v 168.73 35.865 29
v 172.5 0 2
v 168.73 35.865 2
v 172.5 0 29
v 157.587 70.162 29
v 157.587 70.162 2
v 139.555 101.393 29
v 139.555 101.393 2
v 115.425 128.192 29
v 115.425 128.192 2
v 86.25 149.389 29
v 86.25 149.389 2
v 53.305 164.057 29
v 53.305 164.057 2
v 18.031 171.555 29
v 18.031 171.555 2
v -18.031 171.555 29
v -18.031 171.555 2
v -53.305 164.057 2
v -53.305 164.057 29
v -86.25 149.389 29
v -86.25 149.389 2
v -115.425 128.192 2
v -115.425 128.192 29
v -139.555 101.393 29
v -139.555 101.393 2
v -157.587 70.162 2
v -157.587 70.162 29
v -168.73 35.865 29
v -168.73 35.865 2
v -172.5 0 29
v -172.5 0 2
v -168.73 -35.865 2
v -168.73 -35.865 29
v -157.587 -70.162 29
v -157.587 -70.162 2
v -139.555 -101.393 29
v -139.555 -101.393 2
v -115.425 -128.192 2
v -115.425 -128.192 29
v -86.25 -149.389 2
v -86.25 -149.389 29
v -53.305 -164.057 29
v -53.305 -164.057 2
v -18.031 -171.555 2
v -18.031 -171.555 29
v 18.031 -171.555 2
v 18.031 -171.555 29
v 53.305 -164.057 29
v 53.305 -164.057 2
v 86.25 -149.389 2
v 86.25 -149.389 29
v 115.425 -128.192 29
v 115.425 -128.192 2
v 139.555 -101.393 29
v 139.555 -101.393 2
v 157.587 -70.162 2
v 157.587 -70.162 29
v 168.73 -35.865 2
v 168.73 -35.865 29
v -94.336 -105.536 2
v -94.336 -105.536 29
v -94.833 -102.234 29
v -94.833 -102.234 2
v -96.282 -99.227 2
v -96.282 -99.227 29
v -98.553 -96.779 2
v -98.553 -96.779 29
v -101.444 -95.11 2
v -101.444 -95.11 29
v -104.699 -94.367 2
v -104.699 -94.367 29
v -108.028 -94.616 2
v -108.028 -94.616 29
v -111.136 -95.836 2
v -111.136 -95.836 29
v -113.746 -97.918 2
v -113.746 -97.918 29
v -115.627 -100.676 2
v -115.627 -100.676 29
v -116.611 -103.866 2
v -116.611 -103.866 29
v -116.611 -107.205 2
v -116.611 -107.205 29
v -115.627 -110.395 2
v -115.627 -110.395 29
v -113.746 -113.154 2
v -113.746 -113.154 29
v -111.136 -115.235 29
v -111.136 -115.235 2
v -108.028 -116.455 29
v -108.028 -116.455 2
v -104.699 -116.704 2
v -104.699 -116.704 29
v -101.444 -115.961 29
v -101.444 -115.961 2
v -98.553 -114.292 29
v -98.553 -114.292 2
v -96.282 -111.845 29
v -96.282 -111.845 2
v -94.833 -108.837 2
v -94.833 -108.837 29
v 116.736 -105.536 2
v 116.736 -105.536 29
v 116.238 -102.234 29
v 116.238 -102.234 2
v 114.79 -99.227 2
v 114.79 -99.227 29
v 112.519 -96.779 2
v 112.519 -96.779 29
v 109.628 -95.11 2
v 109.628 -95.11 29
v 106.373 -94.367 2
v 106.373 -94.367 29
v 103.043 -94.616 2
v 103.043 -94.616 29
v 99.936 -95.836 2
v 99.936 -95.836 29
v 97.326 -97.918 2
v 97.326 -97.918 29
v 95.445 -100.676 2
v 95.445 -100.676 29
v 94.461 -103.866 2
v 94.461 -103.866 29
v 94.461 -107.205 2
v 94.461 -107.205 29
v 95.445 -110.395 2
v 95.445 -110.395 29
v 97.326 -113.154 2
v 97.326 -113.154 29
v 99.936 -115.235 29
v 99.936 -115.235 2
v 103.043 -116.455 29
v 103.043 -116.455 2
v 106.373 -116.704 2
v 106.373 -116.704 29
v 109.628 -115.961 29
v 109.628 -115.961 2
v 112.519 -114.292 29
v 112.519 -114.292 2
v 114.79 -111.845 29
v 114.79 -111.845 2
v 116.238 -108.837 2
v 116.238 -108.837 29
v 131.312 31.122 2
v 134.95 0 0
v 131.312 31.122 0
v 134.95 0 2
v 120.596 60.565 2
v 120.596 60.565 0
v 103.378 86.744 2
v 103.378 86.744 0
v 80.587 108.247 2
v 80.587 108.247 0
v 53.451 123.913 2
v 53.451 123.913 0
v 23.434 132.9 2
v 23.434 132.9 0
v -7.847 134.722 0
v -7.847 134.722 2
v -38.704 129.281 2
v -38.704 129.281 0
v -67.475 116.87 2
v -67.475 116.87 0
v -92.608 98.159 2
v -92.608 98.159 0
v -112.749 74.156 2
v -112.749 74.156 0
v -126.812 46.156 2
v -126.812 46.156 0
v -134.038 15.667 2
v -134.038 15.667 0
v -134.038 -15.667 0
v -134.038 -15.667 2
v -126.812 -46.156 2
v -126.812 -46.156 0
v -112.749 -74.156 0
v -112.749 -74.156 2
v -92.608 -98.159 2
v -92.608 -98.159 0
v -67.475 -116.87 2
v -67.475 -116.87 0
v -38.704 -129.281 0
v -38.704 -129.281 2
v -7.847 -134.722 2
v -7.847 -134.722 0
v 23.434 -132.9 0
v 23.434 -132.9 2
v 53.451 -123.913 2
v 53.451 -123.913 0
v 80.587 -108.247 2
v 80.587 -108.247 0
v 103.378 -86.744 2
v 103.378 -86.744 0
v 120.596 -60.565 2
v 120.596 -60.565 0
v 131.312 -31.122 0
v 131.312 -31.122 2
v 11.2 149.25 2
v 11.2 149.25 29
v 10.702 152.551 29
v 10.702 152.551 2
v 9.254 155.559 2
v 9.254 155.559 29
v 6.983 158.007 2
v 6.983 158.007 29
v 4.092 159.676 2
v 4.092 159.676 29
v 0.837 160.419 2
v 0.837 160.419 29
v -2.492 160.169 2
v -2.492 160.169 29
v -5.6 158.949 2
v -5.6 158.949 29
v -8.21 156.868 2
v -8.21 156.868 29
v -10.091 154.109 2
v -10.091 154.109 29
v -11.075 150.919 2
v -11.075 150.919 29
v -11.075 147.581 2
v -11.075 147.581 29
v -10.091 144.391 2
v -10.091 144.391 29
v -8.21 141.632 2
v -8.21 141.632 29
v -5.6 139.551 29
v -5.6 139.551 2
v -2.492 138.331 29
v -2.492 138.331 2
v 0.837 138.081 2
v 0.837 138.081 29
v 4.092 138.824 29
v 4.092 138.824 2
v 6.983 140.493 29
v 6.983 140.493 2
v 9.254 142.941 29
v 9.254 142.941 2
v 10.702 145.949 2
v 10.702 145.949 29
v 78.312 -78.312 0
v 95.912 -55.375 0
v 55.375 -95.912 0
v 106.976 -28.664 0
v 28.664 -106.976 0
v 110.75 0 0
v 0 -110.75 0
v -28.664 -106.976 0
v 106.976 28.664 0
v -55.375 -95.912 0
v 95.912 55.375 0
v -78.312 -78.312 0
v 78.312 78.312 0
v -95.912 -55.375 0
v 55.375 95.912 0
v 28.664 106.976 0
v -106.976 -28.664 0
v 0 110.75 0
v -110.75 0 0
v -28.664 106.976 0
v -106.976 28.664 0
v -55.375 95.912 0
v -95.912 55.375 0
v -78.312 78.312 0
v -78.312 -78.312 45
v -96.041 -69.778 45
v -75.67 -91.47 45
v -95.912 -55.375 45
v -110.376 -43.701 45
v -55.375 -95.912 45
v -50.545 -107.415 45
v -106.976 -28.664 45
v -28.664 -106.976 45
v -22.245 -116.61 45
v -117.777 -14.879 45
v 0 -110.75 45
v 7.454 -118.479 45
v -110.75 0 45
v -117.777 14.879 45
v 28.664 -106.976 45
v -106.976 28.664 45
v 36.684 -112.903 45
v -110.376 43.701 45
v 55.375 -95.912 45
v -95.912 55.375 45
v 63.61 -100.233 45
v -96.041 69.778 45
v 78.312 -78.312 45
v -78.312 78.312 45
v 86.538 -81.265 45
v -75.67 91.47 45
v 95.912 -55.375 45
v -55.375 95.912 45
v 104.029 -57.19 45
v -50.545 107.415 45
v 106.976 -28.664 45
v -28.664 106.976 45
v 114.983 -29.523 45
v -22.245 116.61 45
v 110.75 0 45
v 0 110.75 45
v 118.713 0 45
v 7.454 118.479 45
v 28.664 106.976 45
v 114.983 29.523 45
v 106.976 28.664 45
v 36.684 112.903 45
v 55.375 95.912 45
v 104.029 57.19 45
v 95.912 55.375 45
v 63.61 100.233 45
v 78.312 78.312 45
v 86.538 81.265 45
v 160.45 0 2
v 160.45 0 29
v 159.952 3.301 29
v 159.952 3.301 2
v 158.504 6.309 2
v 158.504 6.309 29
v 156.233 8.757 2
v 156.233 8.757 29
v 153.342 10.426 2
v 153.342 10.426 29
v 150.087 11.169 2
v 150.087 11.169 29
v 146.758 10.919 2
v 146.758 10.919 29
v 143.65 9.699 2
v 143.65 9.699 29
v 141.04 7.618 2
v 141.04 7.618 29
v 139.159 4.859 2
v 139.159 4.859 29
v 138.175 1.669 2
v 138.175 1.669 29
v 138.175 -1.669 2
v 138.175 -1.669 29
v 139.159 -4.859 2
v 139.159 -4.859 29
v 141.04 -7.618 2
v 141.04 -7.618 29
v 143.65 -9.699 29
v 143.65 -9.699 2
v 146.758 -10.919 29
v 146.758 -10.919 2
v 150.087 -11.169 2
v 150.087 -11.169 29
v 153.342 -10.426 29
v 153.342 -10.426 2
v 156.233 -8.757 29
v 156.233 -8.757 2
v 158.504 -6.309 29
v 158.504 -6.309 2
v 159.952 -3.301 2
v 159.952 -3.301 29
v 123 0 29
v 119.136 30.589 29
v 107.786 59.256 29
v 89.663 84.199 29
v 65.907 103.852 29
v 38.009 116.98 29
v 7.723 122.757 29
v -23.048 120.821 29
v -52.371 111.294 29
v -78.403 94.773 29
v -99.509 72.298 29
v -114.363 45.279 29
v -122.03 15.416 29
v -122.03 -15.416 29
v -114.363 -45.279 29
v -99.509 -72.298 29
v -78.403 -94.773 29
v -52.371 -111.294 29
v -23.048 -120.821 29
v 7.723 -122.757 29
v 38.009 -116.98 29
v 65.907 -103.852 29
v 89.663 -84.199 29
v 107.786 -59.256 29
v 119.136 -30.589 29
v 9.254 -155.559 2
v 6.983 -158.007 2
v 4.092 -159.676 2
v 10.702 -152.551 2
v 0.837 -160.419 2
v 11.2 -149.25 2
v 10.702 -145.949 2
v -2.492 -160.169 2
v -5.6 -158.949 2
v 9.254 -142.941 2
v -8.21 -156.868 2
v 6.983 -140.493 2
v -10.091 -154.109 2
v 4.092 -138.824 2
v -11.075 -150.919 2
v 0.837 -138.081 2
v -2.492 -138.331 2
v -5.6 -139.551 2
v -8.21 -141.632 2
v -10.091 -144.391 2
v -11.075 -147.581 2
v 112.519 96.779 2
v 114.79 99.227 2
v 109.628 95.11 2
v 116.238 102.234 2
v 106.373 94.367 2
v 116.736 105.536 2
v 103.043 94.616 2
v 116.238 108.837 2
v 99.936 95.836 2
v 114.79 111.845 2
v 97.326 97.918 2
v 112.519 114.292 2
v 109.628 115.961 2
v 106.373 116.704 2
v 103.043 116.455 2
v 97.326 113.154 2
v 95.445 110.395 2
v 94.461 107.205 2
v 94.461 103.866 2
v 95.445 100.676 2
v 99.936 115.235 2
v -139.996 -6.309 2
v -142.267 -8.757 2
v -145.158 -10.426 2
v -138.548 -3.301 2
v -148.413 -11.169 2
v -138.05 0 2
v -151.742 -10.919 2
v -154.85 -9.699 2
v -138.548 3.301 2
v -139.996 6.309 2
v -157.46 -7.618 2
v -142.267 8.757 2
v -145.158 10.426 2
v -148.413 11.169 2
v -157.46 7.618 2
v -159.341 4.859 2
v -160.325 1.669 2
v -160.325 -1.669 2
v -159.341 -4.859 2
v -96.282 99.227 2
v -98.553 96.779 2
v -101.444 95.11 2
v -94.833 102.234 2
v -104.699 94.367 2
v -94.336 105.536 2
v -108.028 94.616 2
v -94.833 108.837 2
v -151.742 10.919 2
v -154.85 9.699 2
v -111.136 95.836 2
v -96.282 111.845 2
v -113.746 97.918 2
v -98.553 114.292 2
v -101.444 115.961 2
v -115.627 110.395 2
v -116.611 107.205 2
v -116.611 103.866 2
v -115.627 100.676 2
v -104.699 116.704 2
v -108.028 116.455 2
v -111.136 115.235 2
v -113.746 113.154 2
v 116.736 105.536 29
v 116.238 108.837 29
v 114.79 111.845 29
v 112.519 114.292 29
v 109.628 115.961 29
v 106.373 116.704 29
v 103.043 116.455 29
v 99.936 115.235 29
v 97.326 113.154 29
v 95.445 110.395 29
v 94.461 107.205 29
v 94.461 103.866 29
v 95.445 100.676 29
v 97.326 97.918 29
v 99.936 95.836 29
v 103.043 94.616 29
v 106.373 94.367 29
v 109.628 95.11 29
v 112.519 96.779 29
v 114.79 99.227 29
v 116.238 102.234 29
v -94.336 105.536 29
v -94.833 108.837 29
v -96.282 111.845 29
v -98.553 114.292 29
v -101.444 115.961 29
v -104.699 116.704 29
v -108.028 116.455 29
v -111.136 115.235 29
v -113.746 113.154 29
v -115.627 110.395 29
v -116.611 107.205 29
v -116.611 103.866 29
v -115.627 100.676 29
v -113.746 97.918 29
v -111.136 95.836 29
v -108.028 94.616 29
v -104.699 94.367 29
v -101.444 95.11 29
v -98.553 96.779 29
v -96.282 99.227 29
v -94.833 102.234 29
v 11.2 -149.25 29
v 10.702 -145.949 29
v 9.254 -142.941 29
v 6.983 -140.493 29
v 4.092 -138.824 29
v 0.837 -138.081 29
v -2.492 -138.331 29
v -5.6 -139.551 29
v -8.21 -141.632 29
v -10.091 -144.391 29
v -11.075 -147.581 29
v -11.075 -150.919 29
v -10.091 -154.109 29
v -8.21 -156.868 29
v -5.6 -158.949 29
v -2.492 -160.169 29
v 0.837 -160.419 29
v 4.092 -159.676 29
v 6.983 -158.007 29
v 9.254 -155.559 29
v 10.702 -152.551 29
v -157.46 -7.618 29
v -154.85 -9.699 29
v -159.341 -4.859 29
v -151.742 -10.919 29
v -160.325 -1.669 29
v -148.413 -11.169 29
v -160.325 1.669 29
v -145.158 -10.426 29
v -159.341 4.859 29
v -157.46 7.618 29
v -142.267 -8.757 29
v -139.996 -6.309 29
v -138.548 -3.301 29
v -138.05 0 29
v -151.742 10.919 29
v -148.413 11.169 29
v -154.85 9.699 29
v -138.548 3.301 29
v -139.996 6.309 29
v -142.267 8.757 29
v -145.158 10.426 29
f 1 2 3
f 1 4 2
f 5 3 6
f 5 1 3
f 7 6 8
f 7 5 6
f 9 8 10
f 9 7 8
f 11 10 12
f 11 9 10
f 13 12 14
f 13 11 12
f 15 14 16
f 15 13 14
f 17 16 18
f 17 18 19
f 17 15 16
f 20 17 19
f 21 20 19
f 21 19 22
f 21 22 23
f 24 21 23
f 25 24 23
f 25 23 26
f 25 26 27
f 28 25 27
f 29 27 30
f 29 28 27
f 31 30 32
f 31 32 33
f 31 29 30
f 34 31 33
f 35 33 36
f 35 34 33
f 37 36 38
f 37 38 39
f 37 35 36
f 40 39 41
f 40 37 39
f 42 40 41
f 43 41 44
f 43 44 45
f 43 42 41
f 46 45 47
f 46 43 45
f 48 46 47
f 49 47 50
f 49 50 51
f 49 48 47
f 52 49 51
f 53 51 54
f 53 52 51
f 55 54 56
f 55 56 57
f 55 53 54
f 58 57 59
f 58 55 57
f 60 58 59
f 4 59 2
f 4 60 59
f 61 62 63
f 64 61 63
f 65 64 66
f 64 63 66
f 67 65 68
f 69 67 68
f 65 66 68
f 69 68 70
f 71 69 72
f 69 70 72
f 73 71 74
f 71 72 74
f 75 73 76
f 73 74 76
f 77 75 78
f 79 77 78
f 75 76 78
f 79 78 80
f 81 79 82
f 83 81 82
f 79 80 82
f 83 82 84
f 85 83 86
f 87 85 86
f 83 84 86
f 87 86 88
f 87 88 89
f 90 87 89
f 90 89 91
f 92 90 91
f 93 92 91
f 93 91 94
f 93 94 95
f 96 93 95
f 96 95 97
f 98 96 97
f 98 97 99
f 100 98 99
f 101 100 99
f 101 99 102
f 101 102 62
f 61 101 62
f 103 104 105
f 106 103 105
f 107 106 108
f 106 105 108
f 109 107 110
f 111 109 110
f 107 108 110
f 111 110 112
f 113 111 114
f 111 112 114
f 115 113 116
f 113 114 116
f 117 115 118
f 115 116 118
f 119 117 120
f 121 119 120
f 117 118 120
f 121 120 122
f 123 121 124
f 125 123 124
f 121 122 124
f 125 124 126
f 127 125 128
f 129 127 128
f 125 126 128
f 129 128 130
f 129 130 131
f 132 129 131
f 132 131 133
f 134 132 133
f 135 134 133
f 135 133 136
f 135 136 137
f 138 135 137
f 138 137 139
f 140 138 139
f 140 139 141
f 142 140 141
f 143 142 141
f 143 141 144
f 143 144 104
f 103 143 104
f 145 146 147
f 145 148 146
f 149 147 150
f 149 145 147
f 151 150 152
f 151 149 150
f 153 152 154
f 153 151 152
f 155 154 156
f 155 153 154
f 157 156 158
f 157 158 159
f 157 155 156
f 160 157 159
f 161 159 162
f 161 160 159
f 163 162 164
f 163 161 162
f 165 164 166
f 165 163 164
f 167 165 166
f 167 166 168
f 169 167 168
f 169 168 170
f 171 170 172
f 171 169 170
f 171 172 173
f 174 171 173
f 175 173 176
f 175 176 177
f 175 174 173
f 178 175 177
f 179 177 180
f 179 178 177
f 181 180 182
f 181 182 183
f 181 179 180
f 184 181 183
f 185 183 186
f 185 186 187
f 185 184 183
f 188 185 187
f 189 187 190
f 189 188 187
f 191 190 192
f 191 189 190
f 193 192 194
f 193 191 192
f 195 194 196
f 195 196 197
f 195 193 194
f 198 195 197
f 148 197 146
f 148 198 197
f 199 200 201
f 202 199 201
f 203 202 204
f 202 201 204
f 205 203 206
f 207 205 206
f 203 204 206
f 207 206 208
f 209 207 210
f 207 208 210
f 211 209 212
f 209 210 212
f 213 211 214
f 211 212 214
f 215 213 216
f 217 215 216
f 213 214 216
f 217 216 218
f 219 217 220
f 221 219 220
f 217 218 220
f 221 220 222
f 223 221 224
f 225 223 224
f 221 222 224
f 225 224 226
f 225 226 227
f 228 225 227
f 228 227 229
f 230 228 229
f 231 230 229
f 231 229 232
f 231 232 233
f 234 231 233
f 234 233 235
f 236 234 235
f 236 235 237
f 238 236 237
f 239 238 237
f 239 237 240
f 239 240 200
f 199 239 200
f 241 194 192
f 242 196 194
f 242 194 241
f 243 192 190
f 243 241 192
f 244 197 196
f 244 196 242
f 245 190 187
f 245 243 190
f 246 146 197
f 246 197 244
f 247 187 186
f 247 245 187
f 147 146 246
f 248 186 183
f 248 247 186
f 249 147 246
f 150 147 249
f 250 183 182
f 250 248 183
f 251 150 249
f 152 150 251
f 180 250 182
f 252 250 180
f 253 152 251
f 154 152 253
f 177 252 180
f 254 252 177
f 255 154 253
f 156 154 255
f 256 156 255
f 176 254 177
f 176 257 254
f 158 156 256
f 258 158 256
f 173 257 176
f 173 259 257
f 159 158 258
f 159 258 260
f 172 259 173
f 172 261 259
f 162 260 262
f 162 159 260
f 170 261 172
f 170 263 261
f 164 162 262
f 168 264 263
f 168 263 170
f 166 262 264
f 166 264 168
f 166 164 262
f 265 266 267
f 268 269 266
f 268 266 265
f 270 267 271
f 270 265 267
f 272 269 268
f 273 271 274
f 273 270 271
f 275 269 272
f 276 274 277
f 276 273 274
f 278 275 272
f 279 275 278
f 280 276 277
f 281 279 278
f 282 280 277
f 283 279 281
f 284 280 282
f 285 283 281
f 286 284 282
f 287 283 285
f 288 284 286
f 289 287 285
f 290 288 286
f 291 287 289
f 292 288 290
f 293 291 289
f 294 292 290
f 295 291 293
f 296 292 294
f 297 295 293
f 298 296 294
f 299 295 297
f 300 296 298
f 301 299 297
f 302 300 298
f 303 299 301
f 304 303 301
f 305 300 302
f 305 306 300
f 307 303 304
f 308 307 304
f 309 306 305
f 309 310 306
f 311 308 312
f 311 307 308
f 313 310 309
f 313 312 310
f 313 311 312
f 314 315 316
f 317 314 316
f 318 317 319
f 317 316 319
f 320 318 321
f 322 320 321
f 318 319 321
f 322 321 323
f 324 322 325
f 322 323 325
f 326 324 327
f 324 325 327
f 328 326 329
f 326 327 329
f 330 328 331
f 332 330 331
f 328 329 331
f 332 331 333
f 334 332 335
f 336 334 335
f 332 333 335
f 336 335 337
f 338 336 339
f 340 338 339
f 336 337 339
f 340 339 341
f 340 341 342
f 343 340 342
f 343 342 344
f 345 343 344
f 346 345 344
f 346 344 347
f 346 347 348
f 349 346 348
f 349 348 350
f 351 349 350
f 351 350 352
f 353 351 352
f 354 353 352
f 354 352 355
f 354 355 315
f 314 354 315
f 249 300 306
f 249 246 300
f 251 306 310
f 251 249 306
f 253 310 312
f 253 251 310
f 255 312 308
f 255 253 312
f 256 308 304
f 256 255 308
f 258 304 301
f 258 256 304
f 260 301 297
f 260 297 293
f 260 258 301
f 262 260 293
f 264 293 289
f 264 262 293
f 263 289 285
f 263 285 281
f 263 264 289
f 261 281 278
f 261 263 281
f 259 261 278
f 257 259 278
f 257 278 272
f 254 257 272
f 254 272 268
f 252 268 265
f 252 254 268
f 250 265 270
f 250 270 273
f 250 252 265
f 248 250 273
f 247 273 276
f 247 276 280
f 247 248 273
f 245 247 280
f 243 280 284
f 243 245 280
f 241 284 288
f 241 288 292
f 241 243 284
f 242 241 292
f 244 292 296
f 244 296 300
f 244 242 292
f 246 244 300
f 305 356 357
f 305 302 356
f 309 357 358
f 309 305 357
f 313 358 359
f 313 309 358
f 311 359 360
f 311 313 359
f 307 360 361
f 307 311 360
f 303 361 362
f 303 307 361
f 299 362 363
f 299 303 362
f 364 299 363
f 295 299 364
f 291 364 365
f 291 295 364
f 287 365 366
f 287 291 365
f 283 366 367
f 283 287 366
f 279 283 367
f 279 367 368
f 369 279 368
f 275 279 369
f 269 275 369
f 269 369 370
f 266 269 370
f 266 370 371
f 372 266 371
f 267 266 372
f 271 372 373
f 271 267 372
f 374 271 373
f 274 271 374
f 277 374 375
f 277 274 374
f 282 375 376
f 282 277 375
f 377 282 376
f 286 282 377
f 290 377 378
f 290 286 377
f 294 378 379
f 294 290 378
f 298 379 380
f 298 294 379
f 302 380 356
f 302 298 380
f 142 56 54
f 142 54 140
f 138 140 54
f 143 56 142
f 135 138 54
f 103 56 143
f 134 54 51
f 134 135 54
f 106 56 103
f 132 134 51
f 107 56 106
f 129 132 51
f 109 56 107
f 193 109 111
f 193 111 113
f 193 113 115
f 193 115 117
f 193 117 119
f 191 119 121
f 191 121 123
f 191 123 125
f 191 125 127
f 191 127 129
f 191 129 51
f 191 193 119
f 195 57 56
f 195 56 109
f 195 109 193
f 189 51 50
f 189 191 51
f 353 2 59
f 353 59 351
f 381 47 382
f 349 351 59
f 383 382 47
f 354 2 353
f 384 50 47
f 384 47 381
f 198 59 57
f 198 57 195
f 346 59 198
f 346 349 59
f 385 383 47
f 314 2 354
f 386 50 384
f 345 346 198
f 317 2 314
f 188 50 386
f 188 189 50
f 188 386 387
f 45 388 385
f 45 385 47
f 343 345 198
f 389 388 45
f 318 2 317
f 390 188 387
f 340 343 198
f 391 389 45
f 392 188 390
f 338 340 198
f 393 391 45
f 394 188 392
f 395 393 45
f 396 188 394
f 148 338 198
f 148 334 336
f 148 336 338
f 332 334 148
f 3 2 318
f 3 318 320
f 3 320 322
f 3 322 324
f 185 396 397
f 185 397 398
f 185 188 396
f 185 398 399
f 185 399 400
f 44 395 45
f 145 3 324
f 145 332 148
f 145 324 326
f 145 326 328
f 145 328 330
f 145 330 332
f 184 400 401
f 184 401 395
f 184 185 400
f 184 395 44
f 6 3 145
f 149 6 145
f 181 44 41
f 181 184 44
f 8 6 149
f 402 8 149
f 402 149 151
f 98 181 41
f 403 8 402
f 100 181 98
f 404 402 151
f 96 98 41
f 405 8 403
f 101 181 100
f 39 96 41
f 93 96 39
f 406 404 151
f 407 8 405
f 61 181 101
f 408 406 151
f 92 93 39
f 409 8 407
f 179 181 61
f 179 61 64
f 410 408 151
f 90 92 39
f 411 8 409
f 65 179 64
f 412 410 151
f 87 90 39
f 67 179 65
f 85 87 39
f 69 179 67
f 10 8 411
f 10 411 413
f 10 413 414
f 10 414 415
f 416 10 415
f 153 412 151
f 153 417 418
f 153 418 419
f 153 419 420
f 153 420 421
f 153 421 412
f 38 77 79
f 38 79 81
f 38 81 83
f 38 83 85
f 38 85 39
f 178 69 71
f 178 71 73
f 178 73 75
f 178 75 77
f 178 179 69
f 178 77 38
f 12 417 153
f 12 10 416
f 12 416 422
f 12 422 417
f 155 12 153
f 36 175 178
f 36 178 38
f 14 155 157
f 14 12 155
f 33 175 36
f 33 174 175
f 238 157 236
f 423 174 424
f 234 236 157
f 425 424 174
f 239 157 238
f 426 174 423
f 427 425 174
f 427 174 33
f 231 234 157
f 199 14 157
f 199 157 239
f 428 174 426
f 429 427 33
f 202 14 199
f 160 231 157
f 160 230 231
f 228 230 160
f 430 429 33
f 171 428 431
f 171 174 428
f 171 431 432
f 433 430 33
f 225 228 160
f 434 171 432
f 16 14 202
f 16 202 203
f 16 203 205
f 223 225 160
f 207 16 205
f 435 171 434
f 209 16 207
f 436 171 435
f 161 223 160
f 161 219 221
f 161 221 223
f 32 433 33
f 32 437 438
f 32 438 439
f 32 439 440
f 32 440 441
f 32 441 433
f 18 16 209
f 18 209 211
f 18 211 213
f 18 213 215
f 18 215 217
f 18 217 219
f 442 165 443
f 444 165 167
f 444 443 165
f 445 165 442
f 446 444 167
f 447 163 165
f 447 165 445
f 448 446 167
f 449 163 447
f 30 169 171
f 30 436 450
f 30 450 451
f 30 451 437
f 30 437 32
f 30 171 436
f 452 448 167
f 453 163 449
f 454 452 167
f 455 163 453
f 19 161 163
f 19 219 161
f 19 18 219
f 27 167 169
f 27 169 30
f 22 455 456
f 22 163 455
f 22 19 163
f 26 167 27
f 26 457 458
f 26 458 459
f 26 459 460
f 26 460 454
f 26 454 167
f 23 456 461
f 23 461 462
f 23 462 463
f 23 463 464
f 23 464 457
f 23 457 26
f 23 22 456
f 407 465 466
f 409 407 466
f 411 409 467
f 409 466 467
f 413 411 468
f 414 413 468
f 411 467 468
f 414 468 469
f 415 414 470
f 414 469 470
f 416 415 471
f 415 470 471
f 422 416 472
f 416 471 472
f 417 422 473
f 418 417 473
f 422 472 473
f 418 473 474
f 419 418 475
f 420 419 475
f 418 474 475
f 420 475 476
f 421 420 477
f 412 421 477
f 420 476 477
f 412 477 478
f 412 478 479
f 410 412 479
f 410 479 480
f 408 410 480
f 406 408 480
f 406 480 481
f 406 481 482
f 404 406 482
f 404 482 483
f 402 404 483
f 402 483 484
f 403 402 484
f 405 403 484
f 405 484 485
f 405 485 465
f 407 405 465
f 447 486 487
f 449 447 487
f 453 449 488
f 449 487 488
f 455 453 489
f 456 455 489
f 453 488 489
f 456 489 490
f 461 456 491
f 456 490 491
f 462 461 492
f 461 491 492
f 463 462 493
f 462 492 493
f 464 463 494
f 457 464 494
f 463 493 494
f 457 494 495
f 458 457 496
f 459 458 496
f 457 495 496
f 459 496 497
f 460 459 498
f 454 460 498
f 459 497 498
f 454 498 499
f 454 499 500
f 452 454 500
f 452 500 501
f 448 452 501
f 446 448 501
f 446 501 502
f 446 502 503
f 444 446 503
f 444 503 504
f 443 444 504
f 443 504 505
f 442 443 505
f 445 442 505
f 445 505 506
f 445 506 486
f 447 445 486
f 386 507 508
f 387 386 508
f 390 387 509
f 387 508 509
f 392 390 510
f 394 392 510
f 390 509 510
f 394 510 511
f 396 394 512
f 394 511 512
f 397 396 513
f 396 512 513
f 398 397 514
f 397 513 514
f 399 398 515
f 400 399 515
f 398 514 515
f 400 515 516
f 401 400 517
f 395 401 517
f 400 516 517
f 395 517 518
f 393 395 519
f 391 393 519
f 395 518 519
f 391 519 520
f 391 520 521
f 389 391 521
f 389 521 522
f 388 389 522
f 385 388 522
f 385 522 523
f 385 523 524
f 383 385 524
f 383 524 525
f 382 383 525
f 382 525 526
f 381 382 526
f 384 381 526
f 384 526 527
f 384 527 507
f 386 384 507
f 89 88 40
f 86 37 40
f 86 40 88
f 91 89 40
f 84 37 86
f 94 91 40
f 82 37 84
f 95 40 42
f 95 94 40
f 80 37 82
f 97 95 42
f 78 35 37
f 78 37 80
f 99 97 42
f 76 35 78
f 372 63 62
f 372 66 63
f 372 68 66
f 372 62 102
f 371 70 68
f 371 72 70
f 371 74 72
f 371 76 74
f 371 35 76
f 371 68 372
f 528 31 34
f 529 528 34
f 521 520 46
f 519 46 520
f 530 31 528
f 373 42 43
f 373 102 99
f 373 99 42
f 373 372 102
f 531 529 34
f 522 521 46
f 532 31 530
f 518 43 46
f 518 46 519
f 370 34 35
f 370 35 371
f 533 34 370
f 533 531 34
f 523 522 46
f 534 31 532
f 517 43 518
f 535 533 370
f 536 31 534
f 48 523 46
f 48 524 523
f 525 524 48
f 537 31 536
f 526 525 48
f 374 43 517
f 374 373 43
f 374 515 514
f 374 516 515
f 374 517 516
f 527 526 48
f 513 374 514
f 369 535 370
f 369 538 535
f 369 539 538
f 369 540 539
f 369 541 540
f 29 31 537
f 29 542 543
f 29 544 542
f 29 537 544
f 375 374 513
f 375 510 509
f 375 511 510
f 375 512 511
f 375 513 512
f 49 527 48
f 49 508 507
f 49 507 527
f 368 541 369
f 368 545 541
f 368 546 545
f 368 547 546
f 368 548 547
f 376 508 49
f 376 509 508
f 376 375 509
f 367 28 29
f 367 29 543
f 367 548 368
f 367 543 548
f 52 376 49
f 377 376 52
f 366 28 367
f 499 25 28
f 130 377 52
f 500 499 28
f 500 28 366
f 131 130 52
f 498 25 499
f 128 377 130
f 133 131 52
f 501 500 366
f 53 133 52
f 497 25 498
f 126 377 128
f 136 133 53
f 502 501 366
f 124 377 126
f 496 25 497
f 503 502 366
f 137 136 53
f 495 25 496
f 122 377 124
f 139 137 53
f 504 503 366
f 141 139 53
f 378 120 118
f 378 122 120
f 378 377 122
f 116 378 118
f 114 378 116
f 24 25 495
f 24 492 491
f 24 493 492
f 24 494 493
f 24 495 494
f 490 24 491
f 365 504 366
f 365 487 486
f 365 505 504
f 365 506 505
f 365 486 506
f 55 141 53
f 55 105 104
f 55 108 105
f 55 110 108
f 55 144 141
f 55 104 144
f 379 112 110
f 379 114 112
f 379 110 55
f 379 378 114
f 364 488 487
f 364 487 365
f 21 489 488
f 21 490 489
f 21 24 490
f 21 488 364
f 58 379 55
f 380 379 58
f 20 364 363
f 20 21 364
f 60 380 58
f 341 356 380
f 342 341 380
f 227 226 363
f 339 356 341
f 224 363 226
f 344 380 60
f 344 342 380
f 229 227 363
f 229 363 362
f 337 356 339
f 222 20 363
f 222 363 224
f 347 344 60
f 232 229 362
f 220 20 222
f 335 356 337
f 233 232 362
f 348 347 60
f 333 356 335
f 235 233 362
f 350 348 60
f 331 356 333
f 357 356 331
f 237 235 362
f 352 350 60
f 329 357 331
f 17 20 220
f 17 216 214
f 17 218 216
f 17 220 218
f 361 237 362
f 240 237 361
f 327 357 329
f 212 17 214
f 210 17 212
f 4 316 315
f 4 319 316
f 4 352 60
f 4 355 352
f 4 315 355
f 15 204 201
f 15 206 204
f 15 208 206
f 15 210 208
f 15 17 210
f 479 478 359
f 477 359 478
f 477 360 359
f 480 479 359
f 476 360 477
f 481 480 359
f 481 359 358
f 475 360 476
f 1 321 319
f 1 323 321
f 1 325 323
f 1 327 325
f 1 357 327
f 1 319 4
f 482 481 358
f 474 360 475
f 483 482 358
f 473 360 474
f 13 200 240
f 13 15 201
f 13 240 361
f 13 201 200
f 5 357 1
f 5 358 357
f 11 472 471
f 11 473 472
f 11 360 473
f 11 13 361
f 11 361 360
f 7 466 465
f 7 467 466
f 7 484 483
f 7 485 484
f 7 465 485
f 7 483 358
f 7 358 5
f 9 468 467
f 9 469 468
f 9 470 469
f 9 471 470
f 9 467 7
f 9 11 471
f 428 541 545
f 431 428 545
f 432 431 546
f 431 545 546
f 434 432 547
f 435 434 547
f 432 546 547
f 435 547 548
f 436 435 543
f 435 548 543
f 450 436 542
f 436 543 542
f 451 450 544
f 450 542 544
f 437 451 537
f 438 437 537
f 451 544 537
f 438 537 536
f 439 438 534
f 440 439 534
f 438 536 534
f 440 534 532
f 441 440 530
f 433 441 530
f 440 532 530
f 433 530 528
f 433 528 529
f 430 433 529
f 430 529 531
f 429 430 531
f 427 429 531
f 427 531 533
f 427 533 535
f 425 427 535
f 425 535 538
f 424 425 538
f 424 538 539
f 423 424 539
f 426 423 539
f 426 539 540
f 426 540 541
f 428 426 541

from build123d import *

# Parameters (mm, degrees)
F2_R     = 11.2
F3_DEPTH = 29.001


with BuildPart() as f1:
    # F0 (on Front) → F1 (revolve)
    with BuildSketch(Plane.XZ):
        Polygon((110.75, 45), (110.75, 0), (134.95, 0), (134.95, 2), (172.5, 2), (172.5, 29), (123, 29), (118.712813, 45), align=None)
    revolve(axis=Axis((0, 0, 22.5), (0, 0, 1)))

    # F2 (on face) → F3 (cut, through all)
    with BuildSketch(Plane.XY.offset(29)):
        with Locations((0, 149.25)):
            Circle(F2_R)
        with Locations((-105.535687, 105.535687)):
            Circle(F2_R)
        with Locations((-149.25, 0)):
            Circle(F2_R)
        with Locations((-105.535687, -105.535687)):
            Circle(F2_R)
        with Locations((0, -149.25)):
            Circle(F2_R)
        with Locations((105.535687, -105.535687)):
            Circle(F2_R)
        with Locations((149.25, 0)):
            Circle(F2_R)
        with Locations((105.535687, 105.535687)):
            Circle(F2_R)
    extrude(amount=-F3_DEPTH, mode=Mode.SUBTRACT)


solid = f1.part
